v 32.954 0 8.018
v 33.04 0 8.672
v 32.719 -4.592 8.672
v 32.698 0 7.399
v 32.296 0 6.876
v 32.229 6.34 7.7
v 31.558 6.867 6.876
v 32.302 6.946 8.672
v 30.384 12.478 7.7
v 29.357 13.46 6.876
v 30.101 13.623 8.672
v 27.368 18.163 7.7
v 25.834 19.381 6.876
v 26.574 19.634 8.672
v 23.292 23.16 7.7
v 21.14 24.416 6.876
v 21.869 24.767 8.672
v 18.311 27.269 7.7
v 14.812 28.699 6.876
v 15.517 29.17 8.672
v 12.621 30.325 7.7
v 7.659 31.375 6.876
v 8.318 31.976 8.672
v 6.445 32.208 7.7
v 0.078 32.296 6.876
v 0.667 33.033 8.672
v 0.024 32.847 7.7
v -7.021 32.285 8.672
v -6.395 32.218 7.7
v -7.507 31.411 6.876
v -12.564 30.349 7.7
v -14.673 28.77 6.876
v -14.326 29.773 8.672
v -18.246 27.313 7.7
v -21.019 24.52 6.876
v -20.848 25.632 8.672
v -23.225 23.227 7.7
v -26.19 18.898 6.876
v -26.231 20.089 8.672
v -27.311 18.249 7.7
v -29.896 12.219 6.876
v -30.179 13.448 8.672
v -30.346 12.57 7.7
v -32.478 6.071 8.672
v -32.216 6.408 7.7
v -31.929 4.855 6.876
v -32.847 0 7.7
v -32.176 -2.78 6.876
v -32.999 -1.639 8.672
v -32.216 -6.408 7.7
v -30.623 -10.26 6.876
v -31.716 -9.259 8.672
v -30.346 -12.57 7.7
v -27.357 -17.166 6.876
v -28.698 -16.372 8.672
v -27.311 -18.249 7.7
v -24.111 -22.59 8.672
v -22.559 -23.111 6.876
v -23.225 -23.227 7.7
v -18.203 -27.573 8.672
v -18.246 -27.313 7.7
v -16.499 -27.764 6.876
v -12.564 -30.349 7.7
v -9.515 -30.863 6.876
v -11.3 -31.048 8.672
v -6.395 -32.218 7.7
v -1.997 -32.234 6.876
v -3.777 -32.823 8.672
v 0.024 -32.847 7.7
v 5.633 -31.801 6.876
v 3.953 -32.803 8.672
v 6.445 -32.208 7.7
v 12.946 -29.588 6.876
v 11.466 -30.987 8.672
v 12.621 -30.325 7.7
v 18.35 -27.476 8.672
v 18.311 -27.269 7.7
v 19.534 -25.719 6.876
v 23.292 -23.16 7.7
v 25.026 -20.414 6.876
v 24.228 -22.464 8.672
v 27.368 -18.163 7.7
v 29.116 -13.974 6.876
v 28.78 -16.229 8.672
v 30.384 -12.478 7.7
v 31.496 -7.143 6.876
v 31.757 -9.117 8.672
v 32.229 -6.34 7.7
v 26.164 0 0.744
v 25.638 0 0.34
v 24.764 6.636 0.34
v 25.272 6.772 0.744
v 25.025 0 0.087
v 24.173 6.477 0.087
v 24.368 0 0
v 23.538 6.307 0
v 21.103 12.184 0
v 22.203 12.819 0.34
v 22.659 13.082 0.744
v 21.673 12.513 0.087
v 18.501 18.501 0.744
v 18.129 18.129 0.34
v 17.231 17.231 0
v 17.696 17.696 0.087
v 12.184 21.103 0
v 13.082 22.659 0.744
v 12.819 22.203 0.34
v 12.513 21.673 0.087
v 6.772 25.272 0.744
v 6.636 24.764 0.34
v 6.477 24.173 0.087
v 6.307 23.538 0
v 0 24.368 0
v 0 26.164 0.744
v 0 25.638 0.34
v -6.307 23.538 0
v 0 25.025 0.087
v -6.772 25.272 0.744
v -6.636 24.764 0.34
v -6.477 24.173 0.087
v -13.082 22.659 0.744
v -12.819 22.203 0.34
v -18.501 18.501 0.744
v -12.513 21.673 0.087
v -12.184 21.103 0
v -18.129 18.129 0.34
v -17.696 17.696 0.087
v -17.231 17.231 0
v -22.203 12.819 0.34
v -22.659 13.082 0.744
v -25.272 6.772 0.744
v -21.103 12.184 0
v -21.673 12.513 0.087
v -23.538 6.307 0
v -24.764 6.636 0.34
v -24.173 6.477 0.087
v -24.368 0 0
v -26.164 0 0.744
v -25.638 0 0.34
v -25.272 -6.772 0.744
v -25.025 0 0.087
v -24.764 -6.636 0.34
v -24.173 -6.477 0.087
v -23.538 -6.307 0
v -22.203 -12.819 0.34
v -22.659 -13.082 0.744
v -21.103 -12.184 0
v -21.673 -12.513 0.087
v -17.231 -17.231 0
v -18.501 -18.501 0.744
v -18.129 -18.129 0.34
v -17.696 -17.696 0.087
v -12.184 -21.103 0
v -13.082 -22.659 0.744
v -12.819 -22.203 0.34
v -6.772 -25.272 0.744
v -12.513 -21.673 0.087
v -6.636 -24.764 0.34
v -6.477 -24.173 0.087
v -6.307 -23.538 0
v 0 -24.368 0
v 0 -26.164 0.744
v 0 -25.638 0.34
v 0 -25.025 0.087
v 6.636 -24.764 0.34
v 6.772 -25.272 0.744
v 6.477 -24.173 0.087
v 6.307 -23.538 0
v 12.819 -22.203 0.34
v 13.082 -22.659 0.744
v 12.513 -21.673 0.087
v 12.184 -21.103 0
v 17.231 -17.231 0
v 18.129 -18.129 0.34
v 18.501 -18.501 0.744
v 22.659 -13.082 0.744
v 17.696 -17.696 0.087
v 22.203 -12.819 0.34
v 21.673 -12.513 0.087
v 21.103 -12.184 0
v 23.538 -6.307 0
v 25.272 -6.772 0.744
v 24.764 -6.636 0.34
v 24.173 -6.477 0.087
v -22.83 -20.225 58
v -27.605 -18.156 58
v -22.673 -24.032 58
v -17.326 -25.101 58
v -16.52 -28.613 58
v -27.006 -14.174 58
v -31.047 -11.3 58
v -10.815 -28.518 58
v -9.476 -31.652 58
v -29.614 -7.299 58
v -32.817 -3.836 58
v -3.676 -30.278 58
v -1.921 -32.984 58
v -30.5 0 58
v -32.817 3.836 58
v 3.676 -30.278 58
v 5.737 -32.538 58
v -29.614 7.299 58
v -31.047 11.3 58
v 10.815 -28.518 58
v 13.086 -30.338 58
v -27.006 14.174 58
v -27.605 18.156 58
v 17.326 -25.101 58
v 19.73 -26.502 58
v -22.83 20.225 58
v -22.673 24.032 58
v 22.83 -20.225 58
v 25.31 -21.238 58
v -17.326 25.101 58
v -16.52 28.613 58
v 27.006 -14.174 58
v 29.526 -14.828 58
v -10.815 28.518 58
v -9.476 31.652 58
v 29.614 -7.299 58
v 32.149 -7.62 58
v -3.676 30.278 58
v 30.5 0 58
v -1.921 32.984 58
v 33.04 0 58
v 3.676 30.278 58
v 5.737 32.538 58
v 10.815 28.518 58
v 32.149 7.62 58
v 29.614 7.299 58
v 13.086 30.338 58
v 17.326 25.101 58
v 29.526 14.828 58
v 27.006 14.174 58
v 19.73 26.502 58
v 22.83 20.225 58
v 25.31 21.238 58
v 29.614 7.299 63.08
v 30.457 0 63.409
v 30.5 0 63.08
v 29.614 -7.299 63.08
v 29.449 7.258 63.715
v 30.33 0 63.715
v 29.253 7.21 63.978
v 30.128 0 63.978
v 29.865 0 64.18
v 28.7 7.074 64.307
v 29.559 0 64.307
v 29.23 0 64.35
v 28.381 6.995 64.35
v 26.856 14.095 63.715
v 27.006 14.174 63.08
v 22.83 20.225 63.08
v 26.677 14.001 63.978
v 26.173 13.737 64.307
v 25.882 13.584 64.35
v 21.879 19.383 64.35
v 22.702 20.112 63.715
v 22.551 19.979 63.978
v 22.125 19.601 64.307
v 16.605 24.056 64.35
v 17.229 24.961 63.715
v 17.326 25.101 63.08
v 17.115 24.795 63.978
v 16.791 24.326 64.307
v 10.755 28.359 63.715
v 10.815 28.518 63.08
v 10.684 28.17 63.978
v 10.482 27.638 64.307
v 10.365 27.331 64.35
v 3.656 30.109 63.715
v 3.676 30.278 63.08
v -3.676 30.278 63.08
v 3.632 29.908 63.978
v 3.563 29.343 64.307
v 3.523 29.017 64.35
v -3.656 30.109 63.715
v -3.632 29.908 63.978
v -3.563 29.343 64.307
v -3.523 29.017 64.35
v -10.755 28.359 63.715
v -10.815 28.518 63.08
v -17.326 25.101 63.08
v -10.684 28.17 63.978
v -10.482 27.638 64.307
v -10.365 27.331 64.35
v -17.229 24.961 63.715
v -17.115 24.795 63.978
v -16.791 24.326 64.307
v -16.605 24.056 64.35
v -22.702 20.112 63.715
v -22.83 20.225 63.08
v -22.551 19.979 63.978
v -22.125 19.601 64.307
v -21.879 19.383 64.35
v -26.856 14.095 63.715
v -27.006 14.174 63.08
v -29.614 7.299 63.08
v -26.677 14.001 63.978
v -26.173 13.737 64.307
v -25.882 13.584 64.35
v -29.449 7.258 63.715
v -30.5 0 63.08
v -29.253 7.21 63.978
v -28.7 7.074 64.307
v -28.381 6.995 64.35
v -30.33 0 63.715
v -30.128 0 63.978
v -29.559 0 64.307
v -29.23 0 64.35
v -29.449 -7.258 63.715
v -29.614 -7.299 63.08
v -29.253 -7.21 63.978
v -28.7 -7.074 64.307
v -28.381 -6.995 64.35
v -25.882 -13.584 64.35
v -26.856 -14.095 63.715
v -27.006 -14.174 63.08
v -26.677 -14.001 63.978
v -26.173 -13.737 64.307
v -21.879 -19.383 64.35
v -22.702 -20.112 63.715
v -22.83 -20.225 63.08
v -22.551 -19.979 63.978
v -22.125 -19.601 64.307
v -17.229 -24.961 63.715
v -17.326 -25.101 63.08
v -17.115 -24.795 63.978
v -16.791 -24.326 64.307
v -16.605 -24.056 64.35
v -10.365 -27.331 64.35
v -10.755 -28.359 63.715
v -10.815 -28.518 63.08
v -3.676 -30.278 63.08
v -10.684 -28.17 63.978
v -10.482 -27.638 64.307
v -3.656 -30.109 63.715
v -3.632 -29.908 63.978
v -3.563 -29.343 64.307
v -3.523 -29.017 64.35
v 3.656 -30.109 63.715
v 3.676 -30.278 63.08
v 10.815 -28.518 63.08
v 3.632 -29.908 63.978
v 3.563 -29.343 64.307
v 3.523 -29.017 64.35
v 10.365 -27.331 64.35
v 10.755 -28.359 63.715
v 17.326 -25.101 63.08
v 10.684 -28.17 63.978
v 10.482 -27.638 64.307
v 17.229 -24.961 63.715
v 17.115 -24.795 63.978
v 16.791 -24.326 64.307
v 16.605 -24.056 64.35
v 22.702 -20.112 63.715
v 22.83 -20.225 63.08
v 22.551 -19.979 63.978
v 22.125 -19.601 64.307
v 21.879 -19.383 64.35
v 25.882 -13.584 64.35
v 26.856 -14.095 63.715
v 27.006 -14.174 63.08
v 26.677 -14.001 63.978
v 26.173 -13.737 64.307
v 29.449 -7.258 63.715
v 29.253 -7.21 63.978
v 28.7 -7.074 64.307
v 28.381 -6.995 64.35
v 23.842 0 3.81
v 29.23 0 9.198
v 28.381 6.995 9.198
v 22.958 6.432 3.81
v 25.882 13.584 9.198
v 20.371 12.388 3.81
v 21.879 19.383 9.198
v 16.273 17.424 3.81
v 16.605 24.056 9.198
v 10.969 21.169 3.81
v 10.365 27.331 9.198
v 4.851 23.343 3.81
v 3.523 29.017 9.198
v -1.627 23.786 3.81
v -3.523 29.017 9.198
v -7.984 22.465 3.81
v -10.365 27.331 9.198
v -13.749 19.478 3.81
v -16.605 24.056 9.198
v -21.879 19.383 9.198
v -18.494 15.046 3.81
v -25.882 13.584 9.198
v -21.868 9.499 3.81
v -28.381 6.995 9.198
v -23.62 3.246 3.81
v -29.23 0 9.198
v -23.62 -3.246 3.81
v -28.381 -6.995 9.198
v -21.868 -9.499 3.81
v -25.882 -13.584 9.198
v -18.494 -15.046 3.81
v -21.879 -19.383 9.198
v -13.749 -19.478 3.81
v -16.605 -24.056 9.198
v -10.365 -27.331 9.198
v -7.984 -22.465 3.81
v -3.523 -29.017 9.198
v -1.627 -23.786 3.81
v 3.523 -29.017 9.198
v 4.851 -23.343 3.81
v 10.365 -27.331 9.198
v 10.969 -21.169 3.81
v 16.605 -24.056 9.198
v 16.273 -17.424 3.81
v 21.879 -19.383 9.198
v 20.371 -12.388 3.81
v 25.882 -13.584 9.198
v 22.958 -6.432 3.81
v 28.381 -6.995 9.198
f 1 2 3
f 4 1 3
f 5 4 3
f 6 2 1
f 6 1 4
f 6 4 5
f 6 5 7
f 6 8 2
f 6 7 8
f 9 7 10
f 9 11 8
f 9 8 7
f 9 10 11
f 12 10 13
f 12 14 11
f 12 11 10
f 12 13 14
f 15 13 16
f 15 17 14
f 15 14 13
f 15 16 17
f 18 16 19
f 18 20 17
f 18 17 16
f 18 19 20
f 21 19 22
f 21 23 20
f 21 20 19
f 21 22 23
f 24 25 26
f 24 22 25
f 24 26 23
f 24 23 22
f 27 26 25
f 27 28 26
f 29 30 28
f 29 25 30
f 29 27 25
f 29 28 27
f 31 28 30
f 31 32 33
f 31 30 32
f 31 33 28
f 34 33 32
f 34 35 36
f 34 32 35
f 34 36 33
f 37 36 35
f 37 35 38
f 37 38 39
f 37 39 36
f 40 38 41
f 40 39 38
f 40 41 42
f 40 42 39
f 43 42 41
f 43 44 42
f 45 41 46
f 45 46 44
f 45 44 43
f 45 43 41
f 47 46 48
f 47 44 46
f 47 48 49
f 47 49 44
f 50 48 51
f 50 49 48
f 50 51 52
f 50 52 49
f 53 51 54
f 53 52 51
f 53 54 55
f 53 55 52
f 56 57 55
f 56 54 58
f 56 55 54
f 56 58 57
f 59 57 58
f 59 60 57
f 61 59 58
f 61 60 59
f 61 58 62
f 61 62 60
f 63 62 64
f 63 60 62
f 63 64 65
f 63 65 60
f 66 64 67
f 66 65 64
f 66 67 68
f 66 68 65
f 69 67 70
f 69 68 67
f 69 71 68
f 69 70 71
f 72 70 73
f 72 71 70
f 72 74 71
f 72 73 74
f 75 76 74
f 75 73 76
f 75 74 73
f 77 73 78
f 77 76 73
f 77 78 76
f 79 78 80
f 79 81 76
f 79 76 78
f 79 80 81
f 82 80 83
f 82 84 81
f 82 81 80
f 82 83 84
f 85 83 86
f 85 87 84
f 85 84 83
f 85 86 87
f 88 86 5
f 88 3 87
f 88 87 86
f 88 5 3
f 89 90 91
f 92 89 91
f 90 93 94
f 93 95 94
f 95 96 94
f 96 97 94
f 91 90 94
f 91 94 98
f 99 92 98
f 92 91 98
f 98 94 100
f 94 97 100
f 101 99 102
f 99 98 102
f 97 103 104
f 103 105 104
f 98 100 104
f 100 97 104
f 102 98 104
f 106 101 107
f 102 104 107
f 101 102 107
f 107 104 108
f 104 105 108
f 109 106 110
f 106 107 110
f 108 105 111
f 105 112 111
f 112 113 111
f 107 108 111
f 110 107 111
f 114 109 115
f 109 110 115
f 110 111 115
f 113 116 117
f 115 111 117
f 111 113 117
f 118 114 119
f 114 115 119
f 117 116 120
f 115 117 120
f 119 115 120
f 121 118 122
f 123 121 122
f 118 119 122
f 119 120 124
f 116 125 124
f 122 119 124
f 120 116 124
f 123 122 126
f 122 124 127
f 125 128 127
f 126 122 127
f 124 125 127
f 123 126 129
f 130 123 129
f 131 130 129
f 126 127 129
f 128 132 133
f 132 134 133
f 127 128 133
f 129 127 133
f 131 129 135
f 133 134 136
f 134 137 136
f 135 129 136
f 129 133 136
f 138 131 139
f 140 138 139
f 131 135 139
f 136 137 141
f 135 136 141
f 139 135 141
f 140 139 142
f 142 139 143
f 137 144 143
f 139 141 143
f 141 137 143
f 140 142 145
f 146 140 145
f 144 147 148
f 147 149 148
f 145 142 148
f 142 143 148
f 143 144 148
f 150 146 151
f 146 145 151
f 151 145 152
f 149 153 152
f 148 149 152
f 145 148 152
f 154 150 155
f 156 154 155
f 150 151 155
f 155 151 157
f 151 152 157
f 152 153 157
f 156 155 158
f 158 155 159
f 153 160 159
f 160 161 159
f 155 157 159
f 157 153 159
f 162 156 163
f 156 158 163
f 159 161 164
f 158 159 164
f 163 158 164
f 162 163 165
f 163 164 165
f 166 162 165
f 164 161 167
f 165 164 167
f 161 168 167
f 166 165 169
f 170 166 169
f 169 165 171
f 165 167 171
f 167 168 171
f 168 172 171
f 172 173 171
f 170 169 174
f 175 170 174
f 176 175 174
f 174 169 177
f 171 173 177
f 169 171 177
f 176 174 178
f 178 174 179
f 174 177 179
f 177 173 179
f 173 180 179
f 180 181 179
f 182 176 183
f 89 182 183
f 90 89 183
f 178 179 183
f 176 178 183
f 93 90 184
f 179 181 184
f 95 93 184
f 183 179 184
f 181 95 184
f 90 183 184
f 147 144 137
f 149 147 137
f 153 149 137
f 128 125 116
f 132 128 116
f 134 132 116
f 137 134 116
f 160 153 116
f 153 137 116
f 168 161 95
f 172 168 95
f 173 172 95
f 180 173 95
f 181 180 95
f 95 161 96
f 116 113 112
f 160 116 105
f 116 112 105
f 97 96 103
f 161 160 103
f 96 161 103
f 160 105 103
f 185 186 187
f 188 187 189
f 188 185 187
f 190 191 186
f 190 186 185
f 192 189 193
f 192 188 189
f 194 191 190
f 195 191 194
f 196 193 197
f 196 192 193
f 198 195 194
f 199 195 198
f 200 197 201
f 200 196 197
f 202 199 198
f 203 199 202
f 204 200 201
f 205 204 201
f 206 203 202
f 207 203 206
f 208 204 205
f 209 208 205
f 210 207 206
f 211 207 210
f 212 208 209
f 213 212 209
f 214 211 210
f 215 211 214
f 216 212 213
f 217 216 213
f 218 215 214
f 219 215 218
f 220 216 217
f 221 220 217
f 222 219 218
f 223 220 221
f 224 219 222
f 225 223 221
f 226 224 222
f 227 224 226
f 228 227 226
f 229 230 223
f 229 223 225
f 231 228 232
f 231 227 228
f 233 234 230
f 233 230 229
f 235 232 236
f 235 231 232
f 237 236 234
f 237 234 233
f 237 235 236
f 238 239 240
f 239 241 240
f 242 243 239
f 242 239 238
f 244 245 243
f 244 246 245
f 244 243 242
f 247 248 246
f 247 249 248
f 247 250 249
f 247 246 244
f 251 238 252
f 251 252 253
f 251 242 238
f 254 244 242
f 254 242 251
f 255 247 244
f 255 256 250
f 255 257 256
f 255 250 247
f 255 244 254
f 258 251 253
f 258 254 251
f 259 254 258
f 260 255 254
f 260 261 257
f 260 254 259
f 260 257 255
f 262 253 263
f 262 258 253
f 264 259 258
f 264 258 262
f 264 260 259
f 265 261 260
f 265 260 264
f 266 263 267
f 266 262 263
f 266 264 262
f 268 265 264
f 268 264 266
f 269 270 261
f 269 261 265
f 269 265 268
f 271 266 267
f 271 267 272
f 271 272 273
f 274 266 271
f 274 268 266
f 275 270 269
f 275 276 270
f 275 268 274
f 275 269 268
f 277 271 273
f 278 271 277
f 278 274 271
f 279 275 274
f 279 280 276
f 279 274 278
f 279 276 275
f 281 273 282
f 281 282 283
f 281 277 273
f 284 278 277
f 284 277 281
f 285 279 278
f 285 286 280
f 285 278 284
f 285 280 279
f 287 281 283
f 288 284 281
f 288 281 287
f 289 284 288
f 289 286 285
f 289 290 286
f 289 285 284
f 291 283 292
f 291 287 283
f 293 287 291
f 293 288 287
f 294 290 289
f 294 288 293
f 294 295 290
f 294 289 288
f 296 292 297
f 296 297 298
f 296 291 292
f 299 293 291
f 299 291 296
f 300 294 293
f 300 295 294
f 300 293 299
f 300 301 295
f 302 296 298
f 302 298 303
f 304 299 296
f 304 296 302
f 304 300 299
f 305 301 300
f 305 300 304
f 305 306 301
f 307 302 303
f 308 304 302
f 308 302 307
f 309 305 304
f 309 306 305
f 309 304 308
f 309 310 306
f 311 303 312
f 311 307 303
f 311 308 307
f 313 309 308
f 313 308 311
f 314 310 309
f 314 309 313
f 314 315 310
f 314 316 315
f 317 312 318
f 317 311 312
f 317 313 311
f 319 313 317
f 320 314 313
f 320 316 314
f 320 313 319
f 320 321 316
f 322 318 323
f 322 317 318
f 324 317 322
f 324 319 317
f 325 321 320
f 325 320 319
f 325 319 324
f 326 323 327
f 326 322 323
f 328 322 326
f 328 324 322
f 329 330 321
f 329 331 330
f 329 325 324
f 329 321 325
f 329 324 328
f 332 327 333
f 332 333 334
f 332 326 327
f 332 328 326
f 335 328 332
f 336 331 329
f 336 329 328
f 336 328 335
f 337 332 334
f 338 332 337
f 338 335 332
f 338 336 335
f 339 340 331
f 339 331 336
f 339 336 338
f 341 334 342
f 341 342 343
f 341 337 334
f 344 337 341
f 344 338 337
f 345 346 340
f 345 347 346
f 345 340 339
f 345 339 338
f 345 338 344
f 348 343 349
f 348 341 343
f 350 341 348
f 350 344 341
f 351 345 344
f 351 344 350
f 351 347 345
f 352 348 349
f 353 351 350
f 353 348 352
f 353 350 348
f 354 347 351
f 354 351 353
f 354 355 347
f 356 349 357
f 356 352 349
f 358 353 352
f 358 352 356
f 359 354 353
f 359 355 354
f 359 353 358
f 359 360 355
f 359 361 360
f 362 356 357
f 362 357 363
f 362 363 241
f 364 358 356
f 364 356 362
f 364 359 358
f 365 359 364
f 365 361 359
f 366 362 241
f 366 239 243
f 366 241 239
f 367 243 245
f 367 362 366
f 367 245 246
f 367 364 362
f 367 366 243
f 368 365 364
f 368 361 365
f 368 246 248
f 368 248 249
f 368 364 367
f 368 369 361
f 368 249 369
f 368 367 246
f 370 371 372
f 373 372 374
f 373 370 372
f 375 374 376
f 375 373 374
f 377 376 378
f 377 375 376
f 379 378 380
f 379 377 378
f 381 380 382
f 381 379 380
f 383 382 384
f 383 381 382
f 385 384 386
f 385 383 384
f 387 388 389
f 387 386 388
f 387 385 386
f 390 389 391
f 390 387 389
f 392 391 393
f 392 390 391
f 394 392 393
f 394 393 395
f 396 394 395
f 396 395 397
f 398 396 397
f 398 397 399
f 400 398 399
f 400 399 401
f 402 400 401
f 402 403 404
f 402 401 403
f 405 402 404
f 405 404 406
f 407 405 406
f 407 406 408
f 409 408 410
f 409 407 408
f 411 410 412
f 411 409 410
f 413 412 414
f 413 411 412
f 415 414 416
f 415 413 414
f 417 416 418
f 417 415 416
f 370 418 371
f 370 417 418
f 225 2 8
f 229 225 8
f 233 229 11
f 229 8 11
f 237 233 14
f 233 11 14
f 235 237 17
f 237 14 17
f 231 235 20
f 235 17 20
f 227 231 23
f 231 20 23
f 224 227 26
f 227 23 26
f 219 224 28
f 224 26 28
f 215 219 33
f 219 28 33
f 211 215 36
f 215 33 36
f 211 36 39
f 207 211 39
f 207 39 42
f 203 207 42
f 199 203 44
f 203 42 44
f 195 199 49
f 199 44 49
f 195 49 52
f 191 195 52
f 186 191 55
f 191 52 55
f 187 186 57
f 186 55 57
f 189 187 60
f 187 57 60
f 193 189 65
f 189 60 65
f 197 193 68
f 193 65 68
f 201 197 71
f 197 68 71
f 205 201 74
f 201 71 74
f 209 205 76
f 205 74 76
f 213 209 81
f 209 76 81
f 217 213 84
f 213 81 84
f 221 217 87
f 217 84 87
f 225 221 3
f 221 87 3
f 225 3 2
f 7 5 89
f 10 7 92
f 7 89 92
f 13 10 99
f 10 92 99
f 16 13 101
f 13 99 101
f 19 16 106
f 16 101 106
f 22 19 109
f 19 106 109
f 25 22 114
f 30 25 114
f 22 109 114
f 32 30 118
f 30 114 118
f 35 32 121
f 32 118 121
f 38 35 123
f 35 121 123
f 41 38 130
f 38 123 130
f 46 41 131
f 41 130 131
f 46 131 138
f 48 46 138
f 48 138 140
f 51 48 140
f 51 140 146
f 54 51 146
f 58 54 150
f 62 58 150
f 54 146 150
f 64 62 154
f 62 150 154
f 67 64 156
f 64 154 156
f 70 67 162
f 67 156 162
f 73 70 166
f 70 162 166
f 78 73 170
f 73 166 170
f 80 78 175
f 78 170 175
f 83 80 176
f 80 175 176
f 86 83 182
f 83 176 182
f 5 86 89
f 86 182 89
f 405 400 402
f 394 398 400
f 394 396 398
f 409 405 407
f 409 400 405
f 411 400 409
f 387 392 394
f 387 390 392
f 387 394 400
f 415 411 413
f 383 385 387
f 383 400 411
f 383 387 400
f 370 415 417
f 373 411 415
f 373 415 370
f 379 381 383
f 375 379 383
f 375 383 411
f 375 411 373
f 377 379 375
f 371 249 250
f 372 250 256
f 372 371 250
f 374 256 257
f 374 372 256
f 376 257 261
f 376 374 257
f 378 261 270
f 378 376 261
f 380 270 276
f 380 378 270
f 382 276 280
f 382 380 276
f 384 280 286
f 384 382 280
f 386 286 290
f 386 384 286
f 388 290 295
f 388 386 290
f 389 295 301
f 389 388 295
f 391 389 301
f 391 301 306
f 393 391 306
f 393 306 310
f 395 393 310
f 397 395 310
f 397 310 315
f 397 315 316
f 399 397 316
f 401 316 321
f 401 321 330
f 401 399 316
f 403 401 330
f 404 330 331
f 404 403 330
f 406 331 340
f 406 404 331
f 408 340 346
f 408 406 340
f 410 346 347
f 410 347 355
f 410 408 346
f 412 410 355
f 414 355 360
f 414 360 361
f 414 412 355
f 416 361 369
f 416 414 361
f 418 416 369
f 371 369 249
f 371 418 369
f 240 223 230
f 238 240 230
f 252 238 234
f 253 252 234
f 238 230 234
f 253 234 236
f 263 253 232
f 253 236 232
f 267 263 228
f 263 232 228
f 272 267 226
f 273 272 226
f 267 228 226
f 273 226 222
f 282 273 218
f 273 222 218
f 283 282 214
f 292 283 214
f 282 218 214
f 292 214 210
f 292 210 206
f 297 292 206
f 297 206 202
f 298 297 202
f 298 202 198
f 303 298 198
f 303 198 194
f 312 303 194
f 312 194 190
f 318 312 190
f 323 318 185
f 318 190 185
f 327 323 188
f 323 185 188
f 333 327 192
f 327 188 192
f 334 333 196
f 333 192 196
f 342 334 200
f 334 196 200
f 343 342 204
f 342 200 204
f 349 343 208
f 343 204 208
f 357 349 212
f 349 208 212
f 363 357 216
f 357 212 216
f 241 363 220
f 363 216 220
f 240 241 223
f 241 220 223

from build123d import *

# Parameters (mm, degrees)
F0_R     = 33.04
F1_DEPTH = 58
F2_SIZE  = 7.62
F3_T     = -3.81
F4_R     = 2.54
F5_R     = 30.5
F5_R_2   = 29.23
F6_DEPTH = 6.35
F7_R     = 1.26999


# Not quite as in the source:
# - a fillet or chamfer is up to 0.001 mm smaller than in the source, because OpenCascade refuses the exact size


with BuildPart() as f1:
    # F0 (on Top) → F1 (new body)
    with BuildSketch(Plane.XY):
        Circle(F0_R)
    extrude(amount=F1_DEPTH)

    # F2
    f2_edges = [f1.edges().sort_by_distance(p)[0] for p in [
        (-33.04, 0, 0),
    ]]
    chamfer(f2_edges, length=F2_SIZE)

    # F3
    f3_openings = [f1.faces().sort_by_distance(p)[0] for p in [
        (0, 0, 58),
    ]]
    offset(amount=F3_T, openings=f3_openings)

    # F4
    f4_edges = [f1.edges().sort_by_distance(p)[0] for p in [
        (-33.04, 0, 7.62),
        (-25.42, 0, 0),
    ]]
    fillet(f4_edges, radius=F4_R)

    # F5 (on face) → F6 (join)
    with BuildSketch(Plane.XY.offset(58)):
        Circle(F5_R)
        Circle(F5_R_2, mode=Mode.SUBTRACT)
    extrude(amount=F6_DEPTH)

    # F7 (radius 1.27 in the source; OpenCascade refuses exactly that, so slightly less here)
    f7_edges = [f1.edges().sort_by_distance(p)[0] for p in [
        (-30.5, 0, 64.35),
    ]]
    fillet(f7_edges, radius=F7_R)


solid = f1.part
